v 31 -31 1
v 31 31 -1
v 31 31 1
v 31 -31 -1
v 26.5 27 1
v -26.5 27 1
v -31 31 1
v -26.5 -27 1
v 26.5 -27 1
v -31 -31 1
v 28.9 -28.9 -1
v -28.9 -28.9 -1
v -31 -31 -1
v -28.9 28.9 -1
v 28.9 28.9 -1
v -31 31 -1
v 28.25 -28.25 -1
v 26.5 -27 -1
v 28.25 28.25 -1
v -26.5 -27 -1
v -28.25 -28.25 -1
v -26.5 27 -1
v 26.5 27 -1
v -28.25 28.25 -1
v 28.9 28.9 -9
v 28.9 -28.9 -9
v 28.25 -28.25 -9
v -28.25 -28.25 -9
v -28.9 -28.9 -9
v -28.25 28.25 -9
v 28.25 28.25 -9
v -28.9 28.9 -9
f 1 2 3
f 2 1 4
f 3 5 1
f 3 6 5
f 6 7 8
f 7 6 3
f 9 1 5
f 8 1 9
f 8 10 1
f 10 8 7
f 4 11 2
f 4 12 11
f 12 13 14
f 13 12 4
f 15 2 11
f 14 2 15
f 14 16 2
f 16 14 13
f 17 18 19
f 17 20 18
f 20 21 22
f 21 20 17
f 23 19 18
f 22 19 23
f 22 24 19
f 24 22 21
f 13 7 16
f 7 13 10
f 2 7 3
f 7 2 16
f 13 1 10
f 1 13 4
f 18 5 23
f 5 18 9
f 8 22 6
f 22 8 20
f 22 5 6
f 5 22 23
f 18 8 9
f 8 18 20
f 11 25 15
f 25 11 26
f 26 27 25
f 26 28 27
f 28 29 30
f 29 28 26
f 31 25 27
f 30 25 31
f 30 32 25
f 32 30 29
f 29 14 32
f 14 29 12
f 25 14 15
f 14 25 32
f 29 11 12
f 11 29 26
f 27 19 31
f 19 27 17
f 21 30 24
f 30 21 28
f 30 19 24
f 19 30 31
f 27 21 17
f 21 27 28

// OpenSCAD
// file: Funnel - empty.scad
$fn=400;

module panel_insert_funnel(t, fh, fdt, fdb) {

    difference() {
        color("lightblue")
        cylinder(h=fh + t, r1=fdb / 2 + t, r2=fdt / 2 + t);

        color("red")
        translate([0, 0, t])
        cylinder(h=fh + 1, r1=fdb / 2, r2=fdt / 2);
    }
};
// main file
$fn=100;

use <./Funnel - empty.scad>;

pi_material_thickness = 2;
pi_funnel_height = 30;
pi_funnel_ring_diameter = 165;
pi_funnel_hole_diameter = 130;
pi_funnel_bottom_diameter = 100;
pi_hmip_width=55;
pi_hmip_depth=55;

pi_draw="cover"; // "funnel" or "cover"

module screw_mount() {
    difference() {
        cylinder(h=4, r=1.5);
        cylinder(h=5, r=0.5);
    }
};

// e = enlargement. When e=0 the case will have the exact size if the raspberry pi. 
// h = The high of the case. Please consider, that the screw-mounts has the high of 4 mm and you hava th add the material thickness of the bottom.
//     When you need the high of 25mm for your raspberry you have to use: 25 + t + 4.
module hmip_case(w, d, e, h, t) {
     
    hmip_case_width=w + e;
    hmip_case_depth=d + e;

    difference() {
        
        // The outside measure of the case
        translate([0, 0, h / 2])
        cube([hmip_case_width + t * 2, hmip_case_depth + t * 2, h], center=true);

        // The inner outcut of the case
        translate([0, 0, h / 2 + t])
        cube([hmip_case_width, hmip_case_depth, h + t], center=true);
    }
};

module hmip_cover(w, d, e, t) {
    hmip_case_width=w + e;
    hmip_case_depth=d + e;

    difference() {
        cube([hmip_case_width + t * 2, hmip_case_depth + t * 2, t], center=true);

        color("red")
        //translate([0, 0, - t])
        cube([w - 2, d - 1, t + 2], center=true);
    }

    difference() {
        // The inner frame
        color("pink")
        translate([0, 0, - t - 2])
        cube([hmip_case_width - 0.2, hmip_case_depth - 0.2, 10], center=true);

        // The inner frame outcut
        color("red")
        translate([0, 0, - t - 2])
        cube([hmip_case_width - 1.5, hmip_case_depth - 1.5, 11], center=true);
    }
};

module funnel() {

    difference() {

        // Create the funnel
        translate([0, 0, - pi_funnel_height - pi_material_thickness])
        panel_insert_funnel(pi_material_thickness, pi_funnel_height, pi_funnel_hole_diameter, pi_funnel_bottom_diameter);
    }

    // Add the cylinder between the funnel and the thermostate case
    translate([0,0,-32])
    cylinder(h = 11, r1 = 22, r2 = 13);

    // Add the hmip case
    translate([0, 0, -22])
    hmip_case(pi_hmip_width, pi_hmip_depth, 3, 20, 2);
};

module cover() {

    // Add the hmip case
    hmip_cover(pi_hmip_width, pi_hmip_depth, 3, 2);
};


if (pi_draw=="funnel") {
    funnel();
};

if (pi_draw=="cover") {
    cover();
};
